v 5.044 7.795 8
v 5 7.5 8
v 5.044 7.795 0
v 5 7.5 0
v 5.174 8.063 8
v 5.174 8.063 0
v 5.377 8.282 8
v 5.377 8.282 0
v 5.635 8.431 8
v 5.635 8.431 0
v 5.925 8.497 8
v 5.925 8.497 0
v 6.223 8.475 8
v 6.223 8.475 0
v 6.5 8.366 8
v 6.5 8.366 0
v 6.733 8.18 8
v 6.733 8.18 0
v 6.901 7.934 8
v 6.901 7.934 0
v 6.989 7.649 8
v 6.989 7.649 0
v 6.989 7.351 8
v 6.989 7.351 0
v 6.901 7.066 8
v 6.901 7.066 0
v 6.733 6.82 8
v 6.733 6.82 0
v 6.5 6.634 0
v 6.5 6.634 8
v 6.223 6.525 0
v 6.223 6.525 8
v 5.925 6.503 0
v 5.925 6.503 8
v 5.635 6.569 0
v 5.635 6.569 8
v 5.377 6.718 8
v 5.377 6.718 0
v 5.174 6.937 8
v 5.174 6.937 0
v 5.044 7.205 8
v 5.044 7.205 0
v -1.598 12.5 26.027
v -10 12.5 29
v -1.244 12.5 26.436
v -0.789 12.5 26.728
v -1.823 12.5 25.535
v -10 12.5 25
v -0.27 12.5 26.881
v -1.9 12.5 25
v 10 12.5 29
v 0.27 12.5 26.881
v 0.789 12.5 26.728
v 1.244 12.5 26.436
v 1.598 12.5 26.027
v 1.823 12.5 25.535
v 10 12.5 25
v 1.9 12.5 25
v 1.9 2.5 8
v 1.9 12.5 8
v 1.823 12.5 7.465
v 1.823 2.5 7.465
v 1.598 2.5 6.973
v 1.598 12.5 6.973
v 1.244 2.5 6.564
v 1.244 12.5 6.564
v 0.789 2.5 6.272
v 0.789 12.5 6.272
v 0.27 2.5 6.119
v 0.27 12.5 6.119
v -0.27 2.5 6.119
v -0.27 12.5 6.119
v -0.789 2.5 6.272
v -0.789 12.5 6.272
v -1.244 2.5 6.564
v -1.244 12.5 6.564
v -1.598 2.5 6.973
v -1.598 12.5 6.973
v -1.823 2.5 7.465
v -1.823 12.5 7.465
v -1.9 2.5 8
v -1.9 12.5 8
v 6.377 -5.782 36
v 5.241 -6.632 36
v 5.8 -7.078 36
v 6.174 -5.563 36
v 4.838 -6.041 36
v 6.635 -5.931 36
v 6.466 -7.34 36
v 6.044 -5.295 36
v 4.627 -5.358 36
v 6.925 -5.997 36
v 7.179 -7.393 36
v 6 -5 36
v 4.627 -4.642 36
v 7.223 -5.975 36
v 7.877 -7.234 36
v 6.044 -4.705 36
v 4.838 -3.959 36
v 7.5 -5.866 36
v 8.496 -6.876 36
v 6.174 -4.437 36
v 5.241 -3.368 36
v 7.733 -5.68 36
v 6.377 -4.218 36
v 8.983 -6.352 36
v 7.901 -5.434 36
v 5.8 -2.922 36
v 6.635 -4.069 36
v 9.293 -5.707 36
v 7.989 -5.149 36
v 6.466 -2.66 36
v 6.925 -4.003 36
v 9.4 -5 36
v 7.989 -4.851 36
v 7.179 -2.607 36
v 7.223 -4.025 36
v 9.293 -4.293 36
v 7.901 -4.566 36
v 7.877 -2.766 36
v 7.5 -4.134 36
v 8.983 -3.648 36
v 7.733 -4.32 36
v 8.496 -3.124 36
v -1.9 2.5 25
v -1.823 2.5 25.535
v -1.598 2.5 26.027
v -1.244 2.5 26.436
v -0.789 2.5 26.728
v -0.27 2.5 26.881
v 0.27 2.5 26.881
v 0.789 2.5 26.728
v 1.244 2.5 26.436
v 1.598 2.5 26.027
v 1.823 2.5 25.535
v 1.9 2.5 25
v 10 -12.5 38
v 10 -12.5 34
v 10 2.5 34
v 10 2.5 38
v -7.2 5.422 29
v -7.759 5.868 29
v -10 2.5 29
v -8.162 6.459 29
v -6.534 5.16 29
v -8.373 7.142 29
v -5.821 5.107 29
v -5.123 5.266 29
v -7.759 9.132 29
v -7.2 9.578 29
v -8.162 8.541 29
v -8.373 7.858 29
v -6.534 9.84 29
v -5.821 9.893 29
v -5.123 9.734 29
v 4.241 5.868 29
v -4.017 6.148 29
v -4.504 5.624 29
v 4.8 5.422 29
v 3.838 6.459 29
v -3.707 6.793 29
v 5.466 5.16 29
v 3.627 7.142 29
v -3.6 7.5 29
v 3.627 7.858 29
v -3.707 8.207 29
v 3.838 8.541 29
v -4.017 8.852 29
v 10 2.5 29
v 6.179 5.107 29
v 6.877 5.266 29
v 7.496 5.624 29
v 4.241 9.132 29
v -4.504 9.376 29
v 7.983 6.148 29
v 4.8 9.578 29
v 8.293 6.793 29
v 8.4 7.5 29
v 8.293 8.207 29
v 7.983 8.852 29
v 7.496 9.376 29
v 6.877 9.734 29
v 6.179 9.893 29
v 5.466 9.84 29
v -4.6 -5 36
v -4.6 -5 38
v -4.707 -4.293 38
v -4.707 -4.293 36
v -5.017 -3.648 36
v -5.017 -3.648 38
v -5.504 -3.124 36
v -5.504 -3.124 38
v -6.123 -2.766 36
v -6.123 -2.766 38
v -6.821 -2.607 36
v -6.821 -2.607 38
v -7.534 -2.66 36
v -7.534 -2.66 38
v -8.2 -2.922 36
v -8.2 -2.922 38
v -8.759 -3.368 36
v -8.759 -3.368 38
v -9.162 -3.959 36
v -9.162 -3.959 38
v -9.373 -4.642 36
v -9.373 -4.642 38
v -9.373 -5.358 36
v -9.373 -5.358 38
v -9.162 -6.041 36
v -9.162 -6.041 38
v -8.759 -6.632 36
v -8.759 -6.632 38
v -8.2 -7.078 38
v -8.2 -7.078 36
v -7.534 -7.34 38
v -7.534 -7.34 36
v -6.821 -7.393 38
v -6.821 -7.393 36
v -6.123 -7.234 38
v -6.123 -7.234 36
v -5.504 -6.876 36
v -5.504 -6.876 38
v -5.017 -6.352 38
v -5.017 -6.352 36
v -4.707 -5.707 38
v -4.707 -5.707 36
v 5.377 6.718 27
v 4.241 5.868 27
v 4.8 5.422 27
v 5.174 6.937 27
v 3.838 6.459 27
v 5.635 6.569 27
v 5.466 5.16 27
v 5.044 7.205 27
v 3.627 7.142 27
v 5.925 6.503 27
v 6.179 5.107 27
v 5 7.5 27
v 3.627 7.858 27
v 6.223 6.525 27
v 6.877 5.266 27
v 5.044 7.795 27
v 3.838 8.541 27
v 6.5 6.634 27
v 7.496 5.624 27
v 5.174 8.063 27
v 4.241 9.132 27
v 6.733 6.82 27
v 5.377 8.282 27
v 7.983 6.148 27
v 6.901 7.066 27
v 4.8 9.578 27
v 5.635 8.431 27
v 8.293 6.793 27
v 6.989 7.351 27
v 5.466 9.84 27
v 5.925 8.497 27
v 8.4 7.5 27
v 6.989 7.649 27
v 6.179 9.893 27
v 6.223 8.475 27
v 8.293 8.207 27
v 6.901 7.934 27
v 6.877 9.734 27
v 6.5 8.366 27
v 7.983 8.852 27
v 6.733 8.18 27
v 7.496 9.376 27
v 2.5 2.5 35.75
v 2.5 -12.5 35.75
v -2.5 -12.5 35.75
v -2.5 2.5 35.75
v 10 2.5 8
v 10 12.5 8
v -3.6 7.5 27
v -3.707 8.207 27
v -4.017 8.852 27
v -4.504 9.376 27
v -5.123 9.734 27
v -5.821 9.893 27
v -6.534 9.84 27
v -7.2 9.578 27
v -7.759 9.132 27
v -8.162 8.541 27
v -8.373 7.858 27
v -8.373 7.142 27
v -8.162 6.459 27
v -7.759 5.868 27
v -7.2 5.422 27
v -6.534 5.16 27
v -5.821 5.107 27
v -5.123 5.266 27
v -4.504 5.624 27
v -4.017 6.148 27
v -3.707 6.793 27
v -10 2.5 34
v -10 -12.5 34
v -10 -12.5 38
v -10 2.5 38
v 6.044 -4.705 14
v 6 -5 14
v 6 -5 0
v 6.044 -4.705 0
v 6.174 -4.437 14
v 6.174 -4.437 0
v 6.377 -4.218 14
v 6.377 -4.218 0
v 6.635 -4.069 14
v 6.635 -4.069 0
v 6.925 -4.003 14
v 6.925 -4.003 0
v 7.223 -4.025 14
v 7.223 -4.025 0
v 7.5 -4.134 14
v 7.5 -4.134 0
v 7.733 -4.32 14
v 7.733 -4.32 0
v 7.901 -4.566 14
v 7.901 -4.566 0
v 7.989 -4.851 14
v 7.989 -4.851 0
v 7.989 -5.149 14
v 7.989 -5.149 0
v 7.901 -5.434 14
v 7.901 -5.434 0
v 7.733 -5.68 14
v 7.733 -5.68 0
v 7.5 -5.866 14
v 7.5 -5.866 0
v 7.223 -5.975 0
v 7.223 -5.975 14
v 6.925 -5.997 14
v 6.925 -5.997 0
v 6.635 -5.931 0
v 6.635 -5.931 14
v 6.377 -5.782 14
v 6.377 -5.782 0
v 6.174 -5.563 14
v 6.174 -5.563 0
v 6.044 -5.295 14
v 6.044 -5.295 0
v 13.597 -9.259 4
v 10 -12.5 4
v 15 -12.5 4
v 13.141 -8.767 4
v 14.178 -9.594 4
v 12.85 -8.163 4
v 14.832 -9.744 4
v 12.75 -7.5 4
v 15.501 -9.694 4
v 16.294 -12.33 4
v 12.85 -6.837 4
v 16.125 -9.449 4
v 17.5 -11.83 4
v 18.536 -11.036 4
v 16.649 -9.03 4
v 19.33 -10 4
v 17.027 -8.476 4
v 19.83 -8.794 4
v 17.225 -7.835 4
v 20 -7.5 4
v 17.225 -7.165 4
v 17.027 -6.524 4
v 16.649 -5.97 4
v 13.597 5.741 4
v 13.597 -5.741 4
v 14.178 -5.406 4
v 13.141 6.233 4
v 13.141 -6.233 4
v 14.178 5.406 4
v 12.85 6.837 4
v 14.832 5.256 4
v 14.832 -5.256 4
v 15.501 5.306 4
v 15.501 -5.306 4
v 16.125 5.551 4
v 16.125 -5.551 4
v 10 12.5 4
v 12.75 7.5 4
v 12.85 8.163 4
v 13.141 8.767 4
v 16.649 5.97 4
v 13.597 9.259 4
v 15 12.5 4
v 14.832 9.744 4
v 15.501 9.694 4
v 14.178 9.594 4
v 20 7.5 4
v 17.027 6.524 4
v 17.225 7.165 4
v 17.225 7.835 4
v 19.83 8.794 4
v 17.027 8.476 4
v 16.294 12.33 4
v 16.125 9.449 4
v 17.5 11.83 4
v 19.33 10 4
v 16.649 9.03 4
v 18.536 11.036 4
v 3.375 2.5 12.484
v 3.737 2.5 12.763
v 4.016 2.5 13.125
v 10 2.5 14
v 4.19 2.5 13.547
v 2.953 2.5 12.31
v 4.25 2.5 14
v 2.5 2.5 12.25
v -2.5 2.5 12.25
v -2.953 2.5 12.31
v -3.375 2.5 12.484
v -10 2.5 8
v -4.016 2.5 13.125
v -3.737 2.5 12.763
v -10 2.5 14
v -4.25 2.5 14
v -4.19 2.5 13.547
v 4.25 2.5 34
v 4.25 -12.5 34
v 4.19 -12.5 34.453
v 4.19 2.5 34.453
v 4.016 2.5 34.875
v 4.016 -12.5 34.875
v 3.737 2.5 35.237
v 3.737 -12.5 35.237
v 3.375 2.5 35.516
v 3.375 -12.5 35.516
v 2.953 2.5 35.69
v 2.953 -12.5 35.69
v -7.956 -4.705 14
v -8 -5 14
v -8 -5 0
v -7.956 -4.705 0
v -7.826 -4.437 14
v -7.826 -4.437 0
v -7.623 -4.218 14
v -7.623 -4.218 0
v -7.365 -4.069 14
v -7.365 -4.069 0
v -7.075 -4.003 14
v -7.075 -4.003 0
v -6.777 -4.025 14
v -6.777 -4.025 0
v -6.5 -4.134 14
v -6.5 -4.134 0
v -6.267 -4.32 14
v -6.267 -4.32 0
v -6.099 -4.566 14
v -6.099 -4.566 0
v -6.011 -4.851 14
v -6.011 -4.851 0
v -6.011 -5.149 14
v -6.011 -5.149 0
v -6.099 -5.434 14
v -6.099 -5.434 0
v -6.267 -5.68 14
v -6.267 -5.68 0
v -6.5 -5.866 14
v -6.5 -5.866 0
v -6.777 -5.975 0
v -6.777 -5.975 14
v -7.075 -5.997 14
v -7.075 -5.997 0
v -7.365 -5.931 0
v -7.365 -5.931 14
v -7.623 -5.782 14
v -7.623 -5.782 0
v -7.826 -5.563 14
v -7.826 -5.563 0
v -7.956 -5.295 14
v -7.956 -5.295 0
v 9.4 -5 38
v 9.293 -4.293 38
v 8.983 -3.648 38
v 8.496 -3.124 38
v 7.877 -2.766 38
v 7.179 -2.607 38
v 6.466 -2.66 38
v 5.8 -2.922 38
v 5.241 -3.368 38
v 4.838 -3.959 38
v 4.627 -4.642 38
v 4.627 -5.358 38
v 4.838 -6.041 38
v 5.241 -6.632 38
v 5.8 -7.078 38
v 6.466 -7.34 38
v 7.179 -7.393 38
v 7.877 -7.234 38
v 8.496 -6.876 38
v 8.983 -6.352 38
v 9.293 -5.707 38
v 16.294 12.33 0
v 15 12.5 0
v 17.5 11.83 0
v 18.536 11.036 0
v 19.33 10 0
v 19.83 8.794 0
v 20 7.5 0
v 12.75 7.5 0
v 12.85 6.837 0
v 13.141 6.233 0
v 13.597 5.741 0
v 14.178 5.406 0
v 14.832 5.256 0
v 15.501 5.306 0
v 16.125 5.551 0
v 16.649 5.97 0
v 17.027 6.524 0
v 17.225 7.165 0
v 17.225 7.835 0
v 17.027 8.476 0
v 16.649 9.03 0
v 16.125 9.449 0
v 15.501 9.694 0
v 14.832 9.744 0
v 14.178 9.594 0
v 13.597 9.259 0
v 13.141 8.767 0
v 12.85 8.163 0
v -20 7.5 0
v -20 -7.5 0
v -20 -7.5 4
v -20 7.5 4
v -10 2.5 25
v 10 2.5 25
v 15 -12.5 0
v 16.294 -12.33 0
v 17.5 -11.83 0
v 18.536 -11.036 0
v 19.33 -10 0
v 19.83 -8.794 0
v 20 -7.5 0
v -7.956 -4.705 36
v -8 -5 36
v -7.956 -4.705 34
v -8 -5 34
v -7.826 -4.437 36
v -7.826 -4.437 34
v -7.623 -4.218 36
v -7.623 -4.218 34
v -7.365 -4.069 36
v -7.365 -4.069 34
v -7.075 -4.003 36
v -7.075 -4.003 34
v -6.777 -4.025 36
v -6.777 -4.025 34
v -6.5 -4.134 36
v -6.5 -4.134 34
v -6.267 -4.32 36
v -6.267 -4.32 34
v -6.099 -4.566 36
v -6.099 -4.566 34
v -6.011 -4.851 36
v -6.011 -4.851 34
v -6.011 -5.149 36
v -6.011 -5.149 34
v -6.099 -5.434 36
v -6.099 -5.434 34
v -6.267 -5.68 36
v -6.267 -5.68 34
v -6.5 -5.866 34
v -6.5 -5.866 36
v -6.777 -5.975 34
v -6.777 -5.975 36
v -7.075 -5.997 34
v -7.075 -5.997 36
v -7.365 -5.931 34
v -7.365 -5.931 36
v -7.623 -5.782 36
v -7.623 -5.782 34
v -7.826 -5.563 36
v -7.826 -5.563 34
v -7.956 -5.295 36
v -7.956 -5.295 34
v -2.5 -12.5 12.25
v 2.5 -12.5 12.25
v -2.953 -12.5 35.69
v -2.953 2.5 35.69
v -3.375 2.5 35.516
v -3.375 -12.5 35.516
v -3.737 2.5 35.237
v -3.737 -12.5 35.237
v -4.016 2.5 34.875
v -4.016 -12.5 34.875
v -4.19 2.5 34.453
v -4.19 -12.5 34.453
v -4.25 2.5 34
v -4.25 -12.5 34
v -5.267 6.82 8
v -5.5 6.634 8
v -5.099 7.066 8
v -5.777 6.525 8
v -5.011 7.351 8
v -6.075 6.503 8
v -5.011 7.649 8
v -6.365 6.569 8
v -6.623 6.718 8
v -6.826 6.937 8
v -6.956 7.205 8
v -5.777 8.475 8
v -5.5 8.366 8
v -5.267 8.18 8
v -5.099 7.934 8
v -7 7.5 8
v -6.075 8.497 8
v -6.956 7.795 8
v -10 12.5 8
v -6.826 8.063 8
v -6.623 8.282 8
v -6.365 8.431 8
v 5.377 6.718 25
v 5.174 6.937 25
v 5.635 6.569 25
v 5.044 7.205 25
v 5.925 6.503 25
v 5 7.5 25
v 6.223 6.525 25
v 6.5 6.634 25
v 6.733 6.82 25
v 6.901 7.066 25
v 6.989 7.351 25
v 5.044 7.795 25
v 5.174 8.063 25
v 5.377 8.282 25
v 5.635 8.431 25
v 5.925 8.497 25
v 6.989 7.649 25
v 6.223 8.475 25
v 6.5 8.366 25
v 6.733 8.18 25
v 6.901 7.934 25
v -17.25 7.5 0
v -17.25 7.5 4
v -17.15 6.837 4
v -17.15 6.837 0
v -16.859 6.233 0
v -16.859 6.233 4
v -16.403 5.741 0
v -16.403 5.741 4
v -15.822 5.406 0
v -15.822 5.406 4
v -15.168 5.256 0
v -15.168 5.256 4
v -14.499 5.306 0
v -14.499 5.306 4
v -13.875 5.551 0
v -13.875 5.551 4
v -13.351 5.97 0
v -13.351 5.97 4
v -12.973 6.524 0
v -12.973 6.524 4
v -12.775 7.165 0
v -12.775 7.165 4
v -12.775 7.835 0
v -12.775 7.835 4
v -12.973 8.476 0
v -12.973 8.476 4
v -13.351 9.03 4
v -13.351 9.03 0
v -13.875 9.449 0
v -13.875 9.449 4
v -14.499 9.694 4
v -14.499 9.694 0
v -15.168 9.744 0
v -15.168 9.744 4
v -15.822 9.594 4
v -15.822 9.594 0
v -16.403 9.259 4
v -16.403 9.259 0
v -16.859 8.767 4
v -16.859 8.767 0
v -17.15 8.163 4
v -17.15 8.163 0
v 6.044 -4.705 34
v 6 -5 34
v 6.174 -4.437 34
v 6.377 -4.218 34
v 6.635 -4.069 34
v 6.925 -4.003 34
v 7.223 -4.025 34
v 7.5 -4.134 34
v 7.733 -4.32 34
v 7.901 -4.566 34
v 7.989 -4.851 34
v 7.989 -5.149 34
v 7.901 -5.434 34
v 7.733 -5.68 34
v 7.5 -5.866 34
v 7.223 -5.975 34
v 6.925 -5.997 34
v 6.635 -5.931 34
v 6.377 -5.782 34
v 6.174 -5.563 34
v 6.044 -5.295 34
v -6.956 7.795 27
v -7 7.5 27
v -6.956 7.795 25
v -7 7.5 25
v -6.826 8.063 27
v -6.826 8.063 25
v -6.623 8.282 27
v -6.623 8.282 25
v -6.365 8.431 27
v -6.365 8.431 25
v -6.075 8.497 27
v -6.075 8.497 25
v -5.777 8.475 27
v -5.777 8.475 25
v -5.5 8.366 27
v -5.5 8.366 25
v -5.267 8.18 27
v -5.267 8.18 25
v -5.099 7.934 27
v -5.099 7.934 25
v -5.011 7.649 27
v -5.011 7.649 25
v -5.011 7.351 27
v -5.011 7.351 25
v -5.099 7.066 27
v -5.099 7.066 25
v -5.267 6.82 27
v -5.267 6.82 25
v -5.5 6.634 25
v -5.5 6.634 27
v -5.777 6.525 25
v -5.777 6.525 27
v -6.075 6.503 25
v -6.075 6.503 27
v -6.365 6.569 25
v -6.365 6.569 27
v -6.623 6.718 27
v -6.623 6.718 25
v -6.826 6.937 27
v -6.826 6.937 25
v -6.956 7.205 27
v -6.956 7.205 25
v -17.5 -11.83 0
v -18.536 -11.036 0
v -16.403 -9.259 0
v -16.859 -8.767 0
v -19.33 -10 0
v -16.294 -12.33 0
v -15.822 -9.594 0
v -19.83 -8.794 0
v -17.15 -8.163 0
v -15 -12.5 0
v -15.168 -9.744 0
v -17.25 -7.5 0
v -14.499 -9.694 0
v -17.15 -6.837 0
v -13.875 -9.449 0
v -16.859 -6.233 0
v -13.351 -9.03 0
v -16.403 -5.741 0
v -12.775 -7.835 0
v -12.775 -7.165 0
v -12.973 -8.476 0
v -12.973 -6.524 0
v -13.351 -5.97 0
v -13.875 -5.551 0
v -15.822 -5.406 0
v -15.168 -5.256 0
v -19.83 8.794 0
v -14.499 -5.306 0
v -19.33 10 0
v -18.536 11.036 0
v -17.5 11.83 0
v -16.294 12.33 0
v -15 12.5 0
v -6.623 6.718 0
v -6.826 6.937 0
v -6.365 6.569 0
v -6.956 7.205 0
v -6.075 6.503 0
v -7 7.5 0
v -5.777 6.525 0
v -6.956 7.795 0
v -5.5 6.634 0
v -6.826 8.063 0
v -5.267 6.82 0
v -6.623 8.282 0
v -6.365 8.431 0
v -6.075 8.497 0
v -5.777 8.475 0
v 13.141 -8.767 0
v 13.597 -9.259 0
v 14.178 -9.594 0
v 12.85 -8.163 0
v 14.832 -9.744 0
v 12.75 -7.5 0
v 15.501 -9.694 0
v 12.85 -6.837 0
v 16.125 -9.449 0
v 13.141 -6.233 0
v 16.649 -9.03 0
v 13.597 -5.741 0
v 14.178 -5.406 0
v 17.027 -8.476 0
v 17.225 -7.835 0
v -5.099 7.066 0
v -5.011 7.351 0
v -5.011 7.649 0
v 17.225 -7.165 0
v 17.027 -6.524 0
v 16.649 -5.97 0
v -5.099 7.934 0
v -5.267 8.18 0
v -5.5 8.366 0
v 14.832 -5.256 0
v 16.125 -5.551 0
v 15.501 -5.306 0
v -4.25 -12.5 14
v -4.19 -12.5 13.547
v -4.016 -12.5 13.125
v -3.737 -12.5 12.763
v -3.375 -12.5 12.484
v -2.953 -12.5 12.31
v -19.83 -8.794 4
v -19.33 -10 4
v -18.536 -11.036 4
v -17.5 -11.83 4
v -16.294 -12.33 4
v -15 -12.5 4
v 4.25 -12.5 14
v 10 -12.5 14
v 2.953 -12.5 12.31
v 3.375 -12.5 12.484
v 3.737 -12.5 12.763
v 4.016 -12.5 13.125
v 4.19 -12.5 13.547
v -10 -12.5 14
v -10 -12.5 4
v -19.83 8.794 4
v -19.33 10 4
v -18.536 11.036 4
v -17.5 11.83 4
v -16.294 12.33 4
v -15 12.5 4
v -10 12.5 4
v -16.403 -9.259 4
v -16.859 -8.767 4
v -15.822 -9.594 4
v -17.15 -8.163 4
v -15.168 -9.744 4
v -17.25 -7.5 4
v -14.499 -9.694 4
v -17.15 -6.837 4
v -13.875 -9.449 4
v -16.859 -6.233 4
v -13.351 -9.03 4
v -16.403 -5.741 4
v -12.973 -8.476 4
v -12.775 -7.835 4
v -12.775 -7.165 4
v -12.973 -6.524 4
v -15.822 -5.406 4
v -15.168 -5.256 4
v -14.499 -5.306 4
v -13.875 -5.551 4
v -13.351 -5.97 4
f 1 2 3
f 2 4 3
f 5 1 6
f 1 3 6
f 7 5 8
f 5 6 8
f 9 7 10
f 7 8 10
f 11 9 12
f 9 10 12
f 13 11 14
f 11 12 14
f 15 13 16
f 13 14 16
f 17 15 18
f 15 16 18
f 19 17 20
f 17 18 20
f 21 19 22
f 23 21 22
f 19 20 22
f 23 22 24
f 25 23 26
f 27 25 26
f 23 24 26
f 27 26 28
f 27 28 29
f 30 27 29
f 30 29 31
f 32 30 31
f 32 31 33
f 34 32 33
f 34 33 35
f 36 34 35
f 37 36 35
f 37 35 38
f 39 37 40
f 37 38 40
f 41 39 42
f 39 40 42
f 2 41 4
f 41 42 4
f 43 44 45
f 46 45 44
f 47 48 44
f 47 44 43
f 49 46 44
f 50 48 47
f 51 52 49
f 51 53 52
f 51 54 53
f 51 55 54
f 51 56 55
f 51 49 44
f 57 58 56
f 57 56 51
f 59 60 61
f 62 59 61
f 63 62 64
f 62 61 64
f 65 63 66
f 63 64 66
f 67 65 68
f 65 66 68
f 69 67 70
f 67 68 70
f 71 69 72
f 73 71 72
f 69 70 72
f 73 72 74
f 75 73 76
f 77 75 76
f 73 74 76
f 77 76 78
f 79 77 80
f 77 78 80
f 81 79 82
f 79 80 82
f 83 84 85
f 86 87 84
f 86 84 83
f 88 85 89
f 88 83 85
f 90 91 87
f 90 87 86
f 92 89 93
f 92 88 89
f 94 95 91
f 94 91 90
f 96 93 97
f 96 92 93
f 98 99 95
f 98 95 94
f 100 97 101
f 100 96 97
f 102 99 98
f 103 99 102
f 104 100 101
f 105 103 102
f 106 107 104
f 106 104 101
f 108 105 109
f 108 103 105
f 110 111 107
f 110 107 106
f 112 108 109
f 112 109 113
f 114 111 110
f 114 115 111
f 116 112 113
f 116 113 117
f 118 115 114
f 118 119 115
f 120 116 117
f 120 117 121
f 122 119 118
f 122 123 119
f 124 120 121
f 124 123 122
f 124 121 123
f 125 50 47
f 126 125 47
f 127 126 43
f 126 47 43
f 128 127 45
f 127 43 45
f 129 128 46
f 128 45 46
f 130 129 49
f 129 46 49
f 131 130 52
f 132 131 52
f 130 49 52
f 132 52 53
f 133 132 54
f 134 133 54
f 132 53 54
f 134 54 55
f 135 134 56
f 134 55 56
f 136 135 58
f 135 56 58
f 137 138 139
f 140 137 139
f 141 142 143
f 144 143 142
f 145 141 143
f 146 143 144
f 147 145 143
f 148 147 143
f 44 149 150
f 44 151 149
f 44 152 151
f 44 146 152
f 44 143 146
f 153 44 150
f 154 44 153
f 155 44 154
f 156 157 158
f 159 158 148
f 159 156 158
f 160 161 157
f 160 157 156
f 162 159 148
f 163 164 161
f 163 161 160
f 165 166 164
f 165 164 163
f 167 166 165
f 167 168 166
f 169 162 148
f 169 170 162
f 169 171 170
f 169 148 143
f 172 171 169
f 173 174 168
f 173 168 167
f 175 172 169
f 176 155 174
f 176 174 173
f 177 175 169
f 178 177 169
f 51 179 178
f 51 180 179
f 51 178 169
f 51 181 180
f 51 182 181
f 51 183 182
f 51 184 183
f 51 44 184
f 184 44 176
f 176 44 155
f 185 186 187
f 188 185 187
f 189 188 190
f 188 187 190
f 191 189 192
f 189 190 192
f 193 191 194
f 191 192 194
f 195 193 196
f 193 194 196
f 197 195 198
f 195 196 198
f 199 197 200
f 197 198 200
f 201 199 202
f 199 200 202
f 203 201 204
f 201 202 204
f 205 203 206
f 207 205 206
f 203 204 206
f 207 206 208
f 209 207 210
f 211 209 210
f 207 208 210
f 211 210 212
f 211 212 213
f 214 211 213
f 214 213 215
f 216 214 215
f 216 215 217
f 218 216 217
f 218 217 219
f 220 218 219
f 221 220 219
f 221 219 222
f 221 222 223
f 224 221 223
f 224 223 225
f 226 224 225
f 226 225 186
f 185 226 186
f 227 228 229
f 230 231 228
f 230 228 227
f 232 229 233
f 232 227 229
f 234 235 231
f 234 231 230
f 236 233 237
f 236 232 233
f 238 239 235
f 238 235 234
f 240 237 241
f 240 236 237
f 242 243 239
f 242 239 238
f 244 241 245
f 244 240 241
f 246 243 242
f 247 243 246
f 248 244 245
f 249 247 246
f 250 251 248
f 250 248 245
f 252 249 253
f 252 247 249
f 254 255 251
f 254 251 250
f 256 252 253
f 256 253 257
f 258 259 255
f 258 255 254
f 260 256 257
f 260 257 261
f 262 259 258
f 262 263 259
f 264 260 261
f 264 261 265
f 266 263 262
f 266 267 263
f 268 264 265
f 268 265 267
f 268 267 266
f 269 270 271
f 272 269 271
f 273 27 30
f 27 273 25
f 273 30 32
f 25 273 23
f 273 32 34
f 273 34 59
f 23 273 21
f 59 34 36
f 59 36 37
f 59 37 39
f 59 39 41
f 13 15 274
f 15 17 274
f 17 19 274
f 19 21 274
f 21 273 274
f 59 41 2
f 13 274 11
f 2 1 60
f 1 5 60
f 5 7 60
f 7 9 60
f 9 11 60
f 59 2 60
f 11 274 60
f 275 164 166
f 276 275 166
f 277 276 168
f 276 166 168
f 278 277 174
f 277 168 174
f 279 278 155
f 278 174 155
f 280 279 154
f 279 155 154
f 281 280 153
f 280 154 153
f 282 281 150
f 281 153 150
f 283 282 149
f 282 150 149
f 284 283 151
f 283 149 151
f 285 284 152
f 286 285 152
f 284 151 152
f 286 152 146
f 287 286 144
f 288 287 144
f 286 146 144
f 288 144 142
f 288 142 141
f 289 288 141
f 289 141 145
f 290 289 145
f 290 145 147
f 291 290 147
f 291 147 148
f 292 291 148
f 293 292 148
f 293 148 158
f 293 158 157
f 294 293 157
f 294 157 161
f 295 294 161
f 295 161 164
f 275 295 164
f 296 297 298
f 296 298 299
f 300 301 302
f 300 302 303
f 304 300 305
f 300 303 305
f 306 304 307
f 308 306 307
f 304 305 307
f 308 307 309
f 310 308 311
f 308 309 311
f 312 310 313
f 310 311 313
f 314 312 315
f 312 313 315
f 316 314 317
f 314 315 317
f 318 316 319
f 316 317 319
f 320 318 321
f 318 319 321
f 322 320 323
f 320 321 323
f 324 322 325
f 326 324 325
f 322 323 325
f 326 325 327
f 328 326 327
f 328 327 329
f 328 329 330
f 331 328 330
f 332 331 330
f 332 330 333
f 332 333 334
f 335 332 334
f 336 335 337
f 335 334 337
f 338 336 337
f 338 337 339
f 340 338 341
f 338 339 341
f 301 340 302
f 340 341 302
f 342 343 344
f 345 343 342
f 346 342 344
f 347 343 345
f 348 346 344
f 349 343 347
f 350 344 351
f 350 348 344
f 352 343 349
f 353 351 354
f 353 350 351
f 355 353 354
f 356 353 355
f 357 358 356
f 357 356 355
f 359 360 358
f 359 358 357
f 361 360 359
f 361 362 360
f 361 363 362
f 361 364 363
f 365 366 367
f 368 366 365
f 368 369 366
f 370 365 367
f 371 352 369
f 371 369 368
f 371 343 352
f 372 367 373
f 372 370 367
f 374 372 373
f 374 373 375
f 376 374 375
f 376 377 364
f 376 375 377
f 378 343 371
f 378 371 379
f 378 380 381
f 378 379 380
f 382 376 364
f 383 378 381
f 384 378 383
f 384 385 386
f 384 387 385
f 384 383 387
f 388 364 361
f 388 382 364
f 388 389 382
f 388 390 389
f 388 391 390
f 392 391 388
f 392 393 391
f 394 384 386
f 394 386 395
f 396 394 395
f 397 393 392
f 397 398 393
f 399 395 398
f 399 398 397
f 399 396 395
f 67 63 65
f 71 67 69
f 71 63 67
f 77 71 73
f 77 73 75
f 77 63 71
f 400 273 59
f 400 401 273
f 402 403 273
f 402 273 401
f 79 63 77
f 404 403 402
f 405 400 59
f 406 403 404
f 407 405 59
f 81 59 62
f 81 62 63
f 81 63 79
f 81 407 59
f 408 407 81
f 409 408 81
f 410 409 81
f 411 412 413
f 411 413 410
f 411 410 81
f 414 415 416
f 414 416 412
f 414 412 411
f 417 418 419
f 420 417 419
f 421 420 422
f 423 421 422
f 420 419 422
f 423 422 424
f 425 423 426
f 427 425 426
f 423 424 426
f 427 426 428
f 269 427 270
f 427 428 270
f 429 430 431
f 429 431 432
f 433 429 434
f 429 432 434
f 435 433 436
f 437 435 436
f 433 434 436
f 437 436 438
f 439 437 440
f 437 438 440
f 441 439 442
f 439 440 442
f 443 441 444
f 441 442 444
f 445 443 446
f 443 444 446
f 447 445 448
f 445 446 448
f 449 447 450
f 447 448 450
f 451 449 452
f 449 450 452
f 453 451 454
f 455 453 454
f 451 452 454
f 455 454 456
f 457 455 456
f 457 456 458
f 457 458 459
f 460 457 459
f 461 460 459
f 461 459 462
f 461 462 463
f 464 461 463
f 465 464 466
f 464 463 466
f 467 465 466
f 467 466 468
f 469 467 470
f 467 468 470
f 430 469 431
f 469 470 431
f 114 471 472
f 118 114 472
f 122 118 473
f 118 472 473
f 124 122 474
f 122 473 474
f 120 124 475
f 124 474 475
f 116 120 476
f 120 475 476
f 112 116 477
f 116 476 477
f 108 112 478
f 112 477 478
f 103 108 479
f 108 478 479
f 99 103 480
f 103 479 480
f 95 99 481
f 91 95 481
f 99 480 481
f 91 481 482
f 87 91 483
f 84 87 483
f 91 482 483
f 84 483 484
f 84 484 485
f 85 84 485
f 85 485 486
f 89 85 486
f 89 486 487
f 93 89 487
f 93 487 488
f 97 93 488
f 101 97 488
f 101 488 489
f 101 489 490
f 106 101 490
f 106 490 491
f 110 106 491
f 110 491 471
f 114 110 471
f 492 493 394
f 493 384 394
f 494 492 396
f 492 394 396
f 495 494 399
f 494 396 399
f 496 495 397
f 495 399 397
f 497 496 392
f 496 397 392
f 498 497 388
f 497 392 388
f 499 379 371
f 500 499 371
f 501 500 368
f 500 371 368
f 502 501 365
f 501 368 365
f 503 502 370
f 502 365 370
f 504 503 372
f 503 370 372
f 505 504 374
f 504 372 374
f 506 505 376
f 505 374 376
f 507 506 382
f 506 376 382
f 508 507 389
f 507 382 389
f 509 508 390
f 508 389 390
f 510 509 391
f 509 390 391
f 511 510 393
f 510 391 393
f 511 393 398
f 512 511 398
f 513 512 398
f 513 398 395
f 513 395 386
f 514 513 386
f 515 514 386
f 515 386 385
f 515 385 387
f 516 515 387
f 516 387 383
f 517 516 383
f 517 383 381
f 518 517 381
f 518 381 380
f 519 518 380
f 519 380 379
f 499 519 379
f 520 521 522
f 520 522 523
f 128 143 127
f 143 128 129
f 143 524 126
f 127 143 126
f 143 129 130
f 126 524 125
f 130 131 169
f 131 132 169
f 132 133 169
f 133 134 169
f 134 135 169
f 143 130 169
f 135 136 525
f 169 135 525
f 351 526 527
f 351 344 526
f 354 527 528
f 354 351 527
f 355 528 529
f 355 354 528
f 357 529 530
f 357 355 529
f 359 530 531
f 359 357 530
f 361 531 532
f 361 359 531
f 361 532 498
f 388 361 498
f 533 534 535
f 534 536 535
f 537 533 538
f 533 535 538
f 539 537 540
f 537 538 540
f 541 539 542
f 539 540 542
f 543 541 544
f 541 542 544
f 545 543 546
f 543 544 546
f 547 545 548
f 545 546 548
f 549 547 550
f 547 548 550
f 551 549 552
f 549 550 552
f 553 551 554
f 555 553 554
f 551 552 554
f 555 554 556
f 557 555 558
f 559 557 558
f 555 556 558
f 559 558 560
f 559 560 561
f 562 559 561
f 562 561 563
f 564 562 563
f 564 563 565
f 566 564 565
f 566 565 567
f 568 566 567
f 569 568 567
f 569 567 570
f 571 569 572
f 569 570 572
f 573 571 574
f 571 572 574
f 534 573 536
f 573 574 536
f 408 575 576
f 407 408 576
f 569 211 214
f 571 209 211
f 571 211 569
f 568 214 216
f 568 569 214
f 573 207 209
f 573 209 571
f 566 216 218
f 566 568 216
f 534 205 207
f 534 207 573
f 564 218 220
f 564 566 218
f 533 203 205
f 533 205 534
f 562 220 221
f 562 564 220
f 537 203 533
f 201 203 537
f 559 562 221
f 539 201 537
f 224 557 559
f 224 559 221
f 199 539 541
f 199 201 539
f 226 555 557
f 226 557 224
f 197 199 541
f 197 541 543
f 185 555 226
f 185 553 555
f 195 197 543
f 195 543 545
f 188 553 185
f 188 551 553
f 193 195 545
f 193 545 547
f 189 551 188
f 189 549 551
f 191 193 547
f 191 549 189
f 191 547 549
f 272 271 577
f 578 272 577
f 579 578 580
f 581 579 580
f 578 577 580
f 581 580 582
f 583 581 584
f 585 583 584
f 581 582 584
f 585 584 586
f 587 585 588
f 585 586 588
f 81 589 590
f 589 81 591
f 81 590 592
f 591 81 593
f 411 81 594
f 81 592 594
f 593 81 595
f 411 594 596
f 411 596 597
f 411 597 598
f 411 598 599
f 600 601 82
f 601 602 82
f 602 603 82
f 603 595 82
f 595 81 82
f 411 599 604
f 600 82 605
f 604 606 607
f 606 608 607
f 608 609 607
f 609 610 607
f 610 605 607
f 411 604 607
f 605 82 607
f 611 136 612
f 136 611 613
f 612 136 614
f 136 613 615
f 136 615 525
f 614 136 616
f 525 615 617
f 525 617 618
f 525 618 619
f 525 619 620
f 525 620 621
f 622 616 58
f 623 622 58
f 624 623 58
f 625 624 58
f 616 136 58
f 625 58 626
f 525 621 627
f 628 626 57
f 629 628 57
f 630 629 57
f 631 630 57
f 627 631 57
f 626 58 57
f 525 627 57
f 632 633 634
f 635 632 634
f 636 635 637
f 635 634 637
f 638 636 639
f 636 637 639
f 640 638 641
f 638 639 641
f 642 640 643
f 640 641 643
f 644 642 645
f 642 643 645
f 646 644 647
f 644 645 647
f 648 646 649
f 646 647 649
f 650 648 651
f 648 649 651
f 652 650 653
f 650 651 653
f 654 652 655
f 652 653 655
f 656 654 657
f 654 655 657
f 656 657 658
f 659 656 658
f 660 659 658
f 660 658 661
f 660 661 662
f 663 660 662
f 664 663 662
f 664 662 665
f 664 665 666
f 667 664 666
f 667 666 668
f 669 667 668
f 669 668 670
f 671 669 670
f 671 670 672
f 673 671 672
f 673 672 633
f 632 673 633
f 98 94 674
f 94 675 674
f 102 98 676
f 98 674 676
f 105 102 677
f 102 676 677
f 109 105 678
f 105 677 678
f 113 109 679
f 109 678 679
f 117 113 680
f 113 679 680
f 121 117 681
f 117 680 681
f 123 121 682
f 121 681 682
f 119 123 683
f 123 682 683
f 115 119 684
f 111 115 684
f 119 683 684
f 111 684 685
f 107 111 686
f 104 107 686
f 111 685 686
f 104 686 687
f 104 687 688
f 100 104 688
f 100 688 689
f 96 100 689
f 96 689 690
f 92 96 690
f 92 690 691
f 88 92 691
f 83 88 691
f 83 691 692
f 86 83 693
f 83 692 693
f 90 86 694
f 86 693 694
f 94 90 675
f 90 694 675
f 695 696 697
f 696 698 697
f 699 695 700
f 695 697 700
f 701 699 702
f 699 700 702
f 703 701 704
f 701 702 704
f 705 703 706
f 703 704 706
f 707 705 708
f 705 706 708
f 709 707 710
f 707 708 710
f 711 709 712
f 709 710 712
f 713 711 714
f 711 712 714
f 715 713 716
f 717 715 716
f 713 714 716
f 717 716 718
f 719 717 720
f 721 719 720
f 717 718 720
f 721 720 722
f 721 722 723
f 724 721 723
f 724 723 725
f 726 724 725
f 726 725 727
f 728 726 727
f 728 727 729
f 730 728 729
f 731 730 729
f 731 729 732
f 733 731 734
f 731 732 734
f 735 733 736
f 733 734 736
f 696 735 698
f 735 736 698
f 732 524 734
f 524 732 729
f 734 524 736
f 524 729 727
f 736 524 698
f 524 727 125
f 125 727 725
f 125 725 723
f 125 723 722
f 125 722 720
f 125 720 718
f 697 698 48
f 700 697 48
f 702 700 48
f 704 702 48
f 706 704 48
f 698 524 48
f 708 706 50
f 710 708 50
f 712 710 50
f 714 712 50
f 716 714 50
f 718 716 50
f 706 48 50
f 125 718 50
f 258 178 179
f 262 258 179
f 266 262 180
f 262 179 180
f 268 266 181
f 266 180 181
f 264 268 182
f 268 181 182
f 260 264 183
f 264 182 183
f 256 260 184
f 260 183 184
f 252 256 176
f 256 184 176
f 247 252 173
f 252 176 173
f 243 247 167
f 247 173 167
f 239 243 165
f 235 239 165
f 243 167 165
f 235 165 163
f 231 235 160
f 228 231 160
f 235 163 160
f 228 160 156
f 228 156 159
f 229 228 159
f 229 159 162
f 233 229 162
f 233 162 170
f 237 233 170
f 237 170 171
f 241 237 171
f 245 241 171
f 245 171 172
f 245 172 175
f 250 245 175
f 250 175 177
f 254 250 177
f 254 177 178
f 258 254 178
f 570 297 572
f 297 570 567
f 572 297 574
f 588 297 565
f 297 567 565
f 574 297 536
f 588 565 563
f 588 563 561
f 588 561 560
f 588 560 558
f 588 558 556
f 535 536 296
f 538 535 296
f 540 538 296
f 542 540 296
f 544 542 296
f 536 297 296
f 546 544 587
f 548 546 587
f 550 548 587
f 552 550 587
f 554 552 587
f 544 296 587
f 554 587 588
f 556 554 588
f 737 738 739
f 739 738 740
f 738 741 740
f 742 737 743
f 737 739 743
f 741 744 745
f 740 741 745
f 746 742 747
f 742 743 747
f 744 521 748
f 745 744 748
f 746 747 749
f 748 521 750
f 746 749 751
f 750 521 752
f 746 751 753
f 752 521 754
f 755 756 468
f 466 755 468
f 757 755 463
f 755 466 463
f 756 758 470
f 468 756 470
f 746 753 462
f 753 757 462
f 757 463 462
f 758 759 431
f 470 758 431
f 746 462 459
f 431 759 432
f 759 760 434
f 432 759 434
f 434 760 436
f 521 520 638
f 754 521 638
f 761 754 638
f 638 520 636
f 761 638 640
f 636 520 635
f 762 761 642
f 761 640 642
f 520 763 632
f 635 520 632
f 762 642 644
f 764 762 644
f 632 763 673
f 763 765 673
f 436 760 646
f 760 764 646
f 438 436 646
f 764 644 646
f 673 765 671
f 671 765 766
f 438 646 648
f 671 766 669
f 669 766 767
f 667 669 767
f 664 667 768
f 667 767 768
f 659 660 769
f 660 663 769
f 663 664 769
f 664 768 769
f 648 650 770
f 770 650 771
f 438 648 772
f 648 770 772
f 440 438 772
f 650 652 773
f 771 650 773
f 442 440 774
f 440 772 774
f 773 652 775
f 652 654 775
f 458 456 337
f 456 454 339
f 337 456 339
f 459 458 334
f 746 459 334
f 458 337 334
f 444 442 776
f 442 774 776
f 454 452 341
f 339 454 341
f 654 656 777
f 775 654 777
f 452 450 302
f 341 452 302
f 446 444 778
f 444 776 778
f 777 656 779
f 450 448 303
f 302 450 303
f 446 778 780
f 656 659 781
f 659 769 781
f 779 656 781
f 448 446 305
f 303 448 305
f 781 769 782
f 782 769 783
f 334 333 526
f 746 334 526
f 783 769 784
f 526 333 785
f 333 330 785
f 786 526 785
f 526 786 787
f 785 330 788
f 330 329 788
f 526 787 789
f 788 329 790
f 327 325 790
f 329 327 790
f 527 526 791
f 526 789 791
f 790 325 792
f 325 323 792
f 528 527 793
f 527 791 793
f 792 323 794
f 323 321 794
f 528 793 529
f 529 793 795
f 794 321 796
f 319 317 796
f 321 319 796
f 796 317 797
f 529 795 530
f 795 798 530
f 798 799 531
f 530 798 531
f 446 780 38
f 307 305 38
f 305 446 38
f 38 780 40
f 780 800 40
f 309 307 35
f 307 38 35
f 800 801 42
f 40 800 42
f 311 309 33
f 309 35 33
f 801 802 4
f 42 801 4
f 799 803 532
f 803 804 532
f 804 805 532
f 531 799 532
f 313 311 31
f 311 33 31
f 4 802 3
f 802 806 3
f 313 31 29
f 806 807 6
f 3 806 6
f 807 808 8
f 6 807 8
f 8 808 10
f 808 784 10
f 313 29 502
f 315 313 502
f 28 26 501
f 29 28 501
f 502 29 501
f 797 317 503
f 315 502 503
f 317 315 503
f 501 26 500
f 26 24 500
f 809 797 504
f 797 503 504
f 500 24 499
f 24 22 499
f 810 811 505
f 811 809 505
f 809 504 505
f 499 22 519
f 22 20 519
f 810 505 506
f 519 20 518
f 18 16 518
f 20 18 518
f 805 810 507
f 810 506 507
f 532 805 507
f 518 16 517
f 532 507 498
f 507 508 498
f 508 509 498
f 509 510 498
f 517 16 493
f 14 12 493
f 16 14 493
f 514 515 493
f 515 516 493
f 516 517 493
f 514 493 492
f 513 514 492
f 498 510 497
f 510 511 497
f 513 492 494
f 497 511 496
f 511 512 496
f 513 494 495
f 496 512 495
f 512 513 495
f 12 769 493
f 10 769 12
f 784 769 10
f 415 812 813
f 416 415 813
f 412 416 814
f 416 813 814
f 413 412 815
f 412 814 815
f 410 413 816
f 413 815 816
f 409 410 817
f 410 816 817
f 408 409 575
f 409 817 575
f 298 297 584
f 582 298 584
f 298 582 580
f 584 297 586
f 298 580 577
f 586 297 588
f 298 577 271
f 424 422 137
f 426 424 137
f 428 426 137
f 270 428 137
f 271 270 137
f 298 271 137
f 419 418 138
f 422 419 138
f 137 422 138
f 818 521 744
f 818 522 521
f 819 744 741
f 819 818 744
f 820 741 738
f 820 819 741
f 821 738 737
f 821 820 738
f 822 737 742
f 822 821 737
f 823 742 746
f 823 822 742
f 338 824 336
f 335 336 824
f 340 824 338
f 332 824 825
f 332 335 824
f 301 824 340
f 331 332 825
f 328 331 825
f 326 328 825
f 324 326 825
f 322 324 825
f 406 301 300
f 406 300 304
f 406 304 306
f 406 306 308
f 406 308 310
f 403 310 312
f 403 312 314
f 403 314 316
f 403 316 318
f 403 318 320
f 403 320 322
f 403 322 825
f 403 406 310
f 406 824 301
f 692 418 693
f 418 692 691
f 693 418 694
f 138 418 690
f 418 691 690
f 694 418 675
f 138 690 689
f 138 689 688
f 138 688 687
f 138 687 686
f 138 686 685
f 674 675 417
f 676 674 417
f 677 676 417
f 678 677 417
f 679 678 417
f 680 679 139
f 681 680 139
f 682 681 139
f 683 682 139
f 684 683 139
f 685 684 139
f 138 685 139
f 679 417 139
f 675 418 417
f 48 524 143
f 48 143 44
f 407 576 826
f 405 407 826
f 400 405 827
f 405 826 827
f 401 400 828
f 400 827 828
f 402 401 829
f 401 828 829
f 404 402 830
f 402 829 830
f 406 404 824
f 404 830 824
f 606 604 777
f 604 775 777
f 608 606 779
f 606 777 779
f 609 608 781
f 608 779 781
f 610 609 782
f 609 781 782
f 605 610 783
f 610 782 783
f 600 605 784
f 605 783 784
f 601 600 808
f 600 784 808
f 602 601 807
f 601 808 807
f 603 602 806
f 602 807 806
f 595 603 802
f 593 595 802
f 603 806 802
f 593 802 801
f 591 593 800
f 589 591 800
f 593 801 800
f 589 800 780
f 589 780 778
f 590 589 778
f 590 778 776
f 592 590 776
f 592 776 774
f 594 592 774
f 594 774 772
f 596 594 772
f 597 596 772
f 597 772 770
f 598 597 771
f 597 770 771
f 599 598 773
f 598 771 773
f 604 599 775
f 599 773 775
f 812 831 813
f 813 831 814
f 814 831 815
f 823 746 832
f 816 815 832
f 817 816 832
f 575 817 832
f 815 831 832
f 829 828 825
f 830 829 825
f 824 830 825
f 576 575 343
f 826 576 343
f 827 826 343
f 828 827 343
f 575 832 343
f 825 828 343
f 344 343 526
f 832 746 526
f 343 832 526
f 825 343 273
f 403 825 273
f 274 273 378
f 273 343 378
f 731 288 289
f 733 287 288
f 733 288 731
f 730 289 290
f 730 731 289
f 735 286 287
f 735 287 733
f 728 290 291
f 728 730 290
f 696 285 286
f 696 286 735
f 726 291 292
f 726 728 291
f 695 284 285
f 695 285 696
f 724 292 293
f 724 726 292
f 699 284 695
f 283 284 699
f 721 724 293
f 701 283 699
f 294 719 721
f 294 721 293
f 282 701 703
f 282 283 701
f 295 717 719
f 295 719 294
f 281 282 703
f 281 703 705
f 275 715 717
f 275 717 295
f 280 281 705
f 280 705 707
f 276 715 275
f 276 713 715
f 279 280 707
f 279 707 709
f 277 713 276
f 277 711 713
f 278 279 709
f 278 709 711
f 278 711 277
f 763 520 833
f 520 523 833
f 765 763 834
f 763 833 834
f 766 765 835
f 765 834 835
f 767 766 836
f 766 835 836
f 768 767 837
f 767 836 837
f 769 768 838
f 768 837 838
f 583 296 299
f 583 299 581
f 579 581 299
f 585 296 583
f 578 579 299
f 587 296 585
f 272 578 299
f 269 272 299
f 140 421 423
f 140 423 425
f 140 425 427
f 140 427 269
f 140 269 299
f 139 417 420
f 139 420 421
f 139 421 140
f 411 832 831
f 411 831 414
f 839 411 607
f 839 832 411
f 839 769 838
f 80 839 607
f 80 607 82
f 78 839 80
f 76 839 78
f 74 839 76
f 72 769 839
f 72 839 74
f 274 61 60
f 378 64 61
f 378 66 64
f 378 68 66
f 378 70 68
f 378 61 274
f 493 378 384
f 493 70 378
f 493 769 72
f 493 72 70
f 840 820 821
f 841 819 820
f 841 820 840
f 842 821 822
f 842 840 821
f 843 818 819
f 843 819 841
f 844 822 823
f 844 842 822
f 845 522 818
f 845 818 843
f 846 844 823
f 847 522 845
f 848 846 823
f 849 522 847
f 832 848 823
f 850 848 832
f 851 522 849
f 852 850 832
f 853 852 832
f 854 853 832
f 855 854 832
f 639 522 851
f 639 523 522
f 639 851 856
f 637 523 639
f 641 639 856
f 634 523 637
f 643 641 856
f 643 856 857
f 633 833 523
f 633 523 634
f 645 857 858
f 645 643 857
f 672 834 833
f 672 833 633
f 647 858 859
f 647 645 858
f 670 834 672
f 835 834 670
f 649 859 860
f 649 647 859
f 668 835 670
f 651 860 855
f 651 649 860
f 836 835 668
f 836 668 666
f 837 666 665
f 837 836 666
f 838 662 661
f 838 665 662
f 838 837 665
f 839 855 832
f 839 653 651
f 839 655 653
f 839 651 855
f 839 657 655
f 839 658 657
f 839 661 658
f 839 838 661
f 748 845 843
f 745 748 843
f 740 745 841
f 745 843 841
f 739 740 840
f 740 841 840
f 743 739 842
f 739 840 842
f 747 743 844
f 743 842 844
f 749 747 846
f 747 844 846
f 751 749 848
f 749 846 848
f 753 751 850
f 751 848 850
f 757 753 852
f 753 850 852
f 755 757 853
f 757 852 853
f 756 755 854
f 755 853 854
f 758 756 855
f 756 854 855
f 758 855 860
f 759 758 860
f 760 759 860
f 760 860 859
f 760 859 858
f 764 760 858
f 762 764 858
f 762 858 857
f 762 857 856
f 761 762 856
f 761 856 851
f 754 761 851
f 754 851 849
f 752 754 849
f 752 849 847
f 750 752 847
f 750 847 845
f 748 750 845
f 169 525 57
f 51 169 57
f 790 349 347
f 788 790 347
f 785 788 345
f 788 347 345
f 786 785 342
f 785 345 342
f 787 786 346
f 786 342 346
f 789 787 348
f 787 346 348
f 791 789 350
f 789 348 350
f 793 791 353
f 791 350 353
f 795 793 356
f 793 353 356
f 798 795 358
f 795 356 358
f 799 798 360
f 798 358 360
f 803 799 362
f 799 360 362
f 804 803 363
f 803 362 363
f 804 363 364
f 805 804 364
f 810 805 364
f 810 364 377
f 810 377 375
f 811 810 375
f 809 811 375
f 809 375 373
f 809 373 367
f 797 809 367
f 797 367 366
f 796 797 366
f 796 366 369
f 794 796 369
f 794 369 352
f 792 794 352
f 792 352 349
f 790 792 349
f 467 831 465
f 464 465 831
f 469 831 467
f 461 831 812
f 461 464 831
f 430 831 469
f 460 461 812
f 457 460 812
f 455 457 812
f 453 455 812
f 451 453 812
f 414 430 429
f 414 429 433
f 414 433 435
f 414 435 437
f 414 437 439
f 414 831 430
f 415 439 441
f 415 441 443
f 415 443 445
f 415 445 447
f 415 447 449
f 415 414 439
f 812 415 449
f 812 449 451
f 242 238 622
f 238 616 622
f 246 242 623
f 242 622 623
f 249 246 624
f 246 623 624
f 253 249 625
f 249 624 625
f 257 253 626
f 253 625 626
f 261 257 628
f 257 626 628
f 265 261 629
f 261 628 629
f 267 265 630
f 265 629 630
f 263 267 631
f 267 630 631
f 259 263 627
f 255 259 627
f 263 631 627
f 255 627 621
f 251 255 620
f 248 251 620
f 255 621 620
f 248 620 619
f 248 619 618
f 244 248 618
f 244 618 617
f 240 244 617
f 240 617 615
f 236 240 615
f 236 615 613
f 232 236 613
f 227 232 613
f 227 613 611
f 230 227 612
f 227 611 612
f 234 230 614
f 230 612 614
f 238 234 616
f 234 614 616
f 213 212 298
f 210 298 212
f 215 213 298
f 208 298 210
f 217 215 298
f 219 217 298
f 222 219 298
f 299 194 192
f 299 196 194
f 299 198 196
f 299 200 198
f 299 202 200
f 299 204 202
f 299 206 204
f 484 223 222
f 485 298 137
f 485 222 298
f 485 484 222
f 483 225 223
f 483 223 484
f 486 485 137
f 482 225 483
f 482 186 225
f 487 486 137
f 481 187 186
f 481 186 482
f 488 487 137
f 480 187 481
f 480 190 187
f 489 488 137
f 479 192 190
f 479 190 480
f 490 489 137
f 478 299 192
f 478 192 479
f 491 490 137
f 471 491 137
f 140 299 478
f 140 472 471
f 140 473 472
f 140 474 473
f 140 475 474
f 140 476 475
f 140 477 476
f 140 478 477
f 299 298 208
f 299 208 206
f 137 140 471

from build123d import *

# Parameters (mm, degrees)
F0_W              = 40
F0_H              = 25
F1_DEPTH          = 4
F2_D              = 4.5
F2_DEPTH          = 50
F2_TIP            = 1.3519363928
F3_W              = 20
F3_H              = 25
F4_DEPTH          = 10
F6_DEPTH          = 10
F8_W              = 20
F8_H              = 10
F9_DEPTH          = 4
F10_R             = 1.9
F11_DEPTH         = 10
F13_D             = 2
F13_DEPTH         = 50
F13_CBORE_D       = 4.8
F13_CBORE_DEPTH   = 2
F13_TIP           = 0.600860619
F13_2_D           = 2
F13_2_DEPTH       = 50
F13_2_CBORE_D     = 4.8
F13_2_CBORE_DEPTH = 2
F13_2_TIP         = 0.600860619
F15_W             = 20
F15_H             = 15
F16_DEPTH         = 4
F18_DEPTH         = 25
F20_D             = 2
F20_DEPTH         = 50
F20_CBORE_D       = 4.8
F20_CBORE_DEPTH   = 2
F20_TIP           = 0.600860619
F20_2_D           = 2
F20_2_DEPTH       = 50
F20_2_CBORE_D     = 4.8
F20_2_CBORE_DEPTH = 2
F20_2_TIP         = 0.600860619
F21_R             = 5


with BuildPart() as f1:
    # F0 (on Top) → F1 (new body)
    with BuildSketch(Plane.XY):
        Rectangle(F0_W, F0_H)
    extrude(amount=F1_DEPTH)

    # F2
    with Locations(Plane(origin=(0, 0, 0), x_dir=(1, 0, 0), z_dir=(0, 0, -1))):
        with Locations((-15, -7.5), (-15, 7.5), (15, 7.5), (15, -7.5)):
            Hole(F2_D / 2, depth=F2_DEPTH)
            with Locations((0, 0, -(F2_DEPTH + F2_TIP / 2))):  # 118° drill point
                Cone(0, F2_D / 2, F2_TIP, mode=Mode.SUBTRACT)

    # F3 (on face) → F4 (join)
    with BuildSketch(Plane.XY.offset(4)):
        Rectangle(F3_W, F3_H)
    extrude(amount=F4_DEPTH)

    # F5 (on face) → F6 (cut)
    with BuildSketch(Plane(origin=(0, 12.5, 0), x_dir=(-1, 0, 0), z_dir=(0, 1, 0))):
        with BuildLine():
            ThreePointArc((-1.9, 8), (0, 9.9), (1.9, 8))
            Line((1.9, 8), (10, 8))
            Line((10, 8), (10, 14))
            Line((10, 14), (-10, 14))
            Line((-10, 14), (-10, 8))
            Line((-10, 8), (-1.9, 8))
        make_face()
        with BuildLine():
            Line((-1.9, 8), (1.9, 8))
            ThreePointArc((1.9, 8), (0, 9.9), (-1.9, 8))
        make_face()
        with BuildLine():
            ThreePointArc((-1.9, 8), (0, 6.1), (1.9, 8))
            Line((1.9, 8), (-1.9, 8))
        make_face()
    extrude(amount=-F6_DEPTH, mode=Mode.SUBTRACT)

    # F13
    with Locations(Plane.XY.offset(29)):
        with Locations((-6, 7.5), (6, 7.5)):
            CounterBoreHole(F13_D / 2, F13_CBORE_D / 2, F13_CBORE_DEPTH, depth=F13_DEPTH)
            with Locations((0, 0, -(F13_DEPTH + F13_TIP / 2))):  # 118° drill point
                Cone(0, F13_D / 2, F13_TIP, mode=Mode.SUBTRACT)


with BuildPart() as f9:
    # F8 (on offset) → F9 (new body)
    with BuildSketch(Plane.XY.offset(25)):
        with Locations((0, 7.5)):
            Rectangle(F8_W, F8_H)
    extrude(amount=F9_DEPTH)

    # F10 (on face) → F11 (cut, through all)
    with BuildSketch(Plane(origin=(0, 12.5, 0), x_dir=(-1, 0, 0), z_dir=(0, 1, 0))):
        with Locations((0, 25)):
            Circle(F10_R)
    extrude(amount=-F11_DEPTH, mode=Mode.SUBTRACT)

    # F13#2
    with Locations(Plane.XY.offset(29)):
        with Locations((-6, 7.5), (6, 7.5)):
            CounterBoreHole(F13_2_D / 2, F13_2_CBORE_D / 2, F13_2_CBORE_DEPTH, depth=F13_2_DEPTH)
            with Locations((0, 0, -(F13_2_DEPTH + F13_2_TIP / 2))):  # 118° drill point
                Cone(0, F13_2_D / 2, F13_2_TIP, mode=Mode.SUBTRACT)


with BuildPart() as f16:
    # F15 (on offset) → F16 (new body)
    with BuildSketch(Plane.XY.offset(34)):
        with Locations((0, -5)):
            Rectangle(F15_W, F15_H)
    extrude(amount=F16_DEPTH)


with BuildPart() as f18_tool:
    # F17 (on face) → F18 (new body)
    with BuildSketch(Plane.XZ.offset(12.5)):
        with BuildLine():
            ThreePointArc((-2.5, 35.75), (-3.7374368671, 35.2374368671), (-4.25, 34))
            Line((-4.25, 34), (4.25, 34))
            ThreePointArc((4.25, 34), (3.7374368671, 35.2374368671), (2.5, 35.75))
            Line((2.5, 35.75), (-2.5, 35.75))
        make_face()
        with BuildLine():
            ThreePointArc((-2.5, 15.75), (-4.25, 14), (-2.5, 12.25))
            Line((-2.5, 12.25), (2.5, 12.25))
            ThreePointArc((2.5, 12.25), (4.25, 14), (2.5, 15.75))
            Line((2.5, 15.75), (-2.5, 15.75))
        make_face()
    extrude(amount=-F18_DEPTH)


with BuildPart() as f1_1:
    add(f1.part)

    # F18: cut by f18_tool
    add(f18_tool.part, mode=Mode.SUBTRACT)

    # F20
    with Locations(Plane.XY.offset(38)):
        with Locations((-7, -5), (7, -5)):
            CounterBoreHole(F20_D / 2, F20_CBORE_D / 2, F20_CBORE_DEPTH, depth=F20_DEPTH)
            with Locations((0, 0, -(F20_DEPTH + F20_TIP / 2))):  # 118° drill point
                Cone(0, F20_D / 2, F20_TIP, mode=Mode.SUBTRACT)

    # F21
    f21_edges = [f1_1.edges().sort_by_distance(p)[0] for p in [
        (-20, 12.5, 2),
        (-20, -12.5, 2),
        (20, -12.5, 2),
        (20, 12.5, 2),
    ]]
    fillet(f21_edges, radius=F21_R)


with BuildPart() as f16_1:
    add(f16.part)

    # F18: cut by f18_tool
    add(f18_tool.part, mode=Mode.SUBTRACT)

    # F20#2
    with Locations(Plane.XY.offset(38)):
        with Locations((-7, -5), (7, -5)):
            CounterBoreHole(F20_2_D / 2, F20_2_CBORE_D / 2, F20_2_CBORE_DEPTH, depth=F20_2_DEPTH)
            with Locations((0, 0, -(F20_2_DEPTH + F20_2_TIP / 2))):  # 118° drill point
                Cone(0, F20_2_D / 2, F20_2_TIP, mode=Mode.SUBTRACT)


solid = Compound([f9.part, f1_1.part, f16_1.part])
